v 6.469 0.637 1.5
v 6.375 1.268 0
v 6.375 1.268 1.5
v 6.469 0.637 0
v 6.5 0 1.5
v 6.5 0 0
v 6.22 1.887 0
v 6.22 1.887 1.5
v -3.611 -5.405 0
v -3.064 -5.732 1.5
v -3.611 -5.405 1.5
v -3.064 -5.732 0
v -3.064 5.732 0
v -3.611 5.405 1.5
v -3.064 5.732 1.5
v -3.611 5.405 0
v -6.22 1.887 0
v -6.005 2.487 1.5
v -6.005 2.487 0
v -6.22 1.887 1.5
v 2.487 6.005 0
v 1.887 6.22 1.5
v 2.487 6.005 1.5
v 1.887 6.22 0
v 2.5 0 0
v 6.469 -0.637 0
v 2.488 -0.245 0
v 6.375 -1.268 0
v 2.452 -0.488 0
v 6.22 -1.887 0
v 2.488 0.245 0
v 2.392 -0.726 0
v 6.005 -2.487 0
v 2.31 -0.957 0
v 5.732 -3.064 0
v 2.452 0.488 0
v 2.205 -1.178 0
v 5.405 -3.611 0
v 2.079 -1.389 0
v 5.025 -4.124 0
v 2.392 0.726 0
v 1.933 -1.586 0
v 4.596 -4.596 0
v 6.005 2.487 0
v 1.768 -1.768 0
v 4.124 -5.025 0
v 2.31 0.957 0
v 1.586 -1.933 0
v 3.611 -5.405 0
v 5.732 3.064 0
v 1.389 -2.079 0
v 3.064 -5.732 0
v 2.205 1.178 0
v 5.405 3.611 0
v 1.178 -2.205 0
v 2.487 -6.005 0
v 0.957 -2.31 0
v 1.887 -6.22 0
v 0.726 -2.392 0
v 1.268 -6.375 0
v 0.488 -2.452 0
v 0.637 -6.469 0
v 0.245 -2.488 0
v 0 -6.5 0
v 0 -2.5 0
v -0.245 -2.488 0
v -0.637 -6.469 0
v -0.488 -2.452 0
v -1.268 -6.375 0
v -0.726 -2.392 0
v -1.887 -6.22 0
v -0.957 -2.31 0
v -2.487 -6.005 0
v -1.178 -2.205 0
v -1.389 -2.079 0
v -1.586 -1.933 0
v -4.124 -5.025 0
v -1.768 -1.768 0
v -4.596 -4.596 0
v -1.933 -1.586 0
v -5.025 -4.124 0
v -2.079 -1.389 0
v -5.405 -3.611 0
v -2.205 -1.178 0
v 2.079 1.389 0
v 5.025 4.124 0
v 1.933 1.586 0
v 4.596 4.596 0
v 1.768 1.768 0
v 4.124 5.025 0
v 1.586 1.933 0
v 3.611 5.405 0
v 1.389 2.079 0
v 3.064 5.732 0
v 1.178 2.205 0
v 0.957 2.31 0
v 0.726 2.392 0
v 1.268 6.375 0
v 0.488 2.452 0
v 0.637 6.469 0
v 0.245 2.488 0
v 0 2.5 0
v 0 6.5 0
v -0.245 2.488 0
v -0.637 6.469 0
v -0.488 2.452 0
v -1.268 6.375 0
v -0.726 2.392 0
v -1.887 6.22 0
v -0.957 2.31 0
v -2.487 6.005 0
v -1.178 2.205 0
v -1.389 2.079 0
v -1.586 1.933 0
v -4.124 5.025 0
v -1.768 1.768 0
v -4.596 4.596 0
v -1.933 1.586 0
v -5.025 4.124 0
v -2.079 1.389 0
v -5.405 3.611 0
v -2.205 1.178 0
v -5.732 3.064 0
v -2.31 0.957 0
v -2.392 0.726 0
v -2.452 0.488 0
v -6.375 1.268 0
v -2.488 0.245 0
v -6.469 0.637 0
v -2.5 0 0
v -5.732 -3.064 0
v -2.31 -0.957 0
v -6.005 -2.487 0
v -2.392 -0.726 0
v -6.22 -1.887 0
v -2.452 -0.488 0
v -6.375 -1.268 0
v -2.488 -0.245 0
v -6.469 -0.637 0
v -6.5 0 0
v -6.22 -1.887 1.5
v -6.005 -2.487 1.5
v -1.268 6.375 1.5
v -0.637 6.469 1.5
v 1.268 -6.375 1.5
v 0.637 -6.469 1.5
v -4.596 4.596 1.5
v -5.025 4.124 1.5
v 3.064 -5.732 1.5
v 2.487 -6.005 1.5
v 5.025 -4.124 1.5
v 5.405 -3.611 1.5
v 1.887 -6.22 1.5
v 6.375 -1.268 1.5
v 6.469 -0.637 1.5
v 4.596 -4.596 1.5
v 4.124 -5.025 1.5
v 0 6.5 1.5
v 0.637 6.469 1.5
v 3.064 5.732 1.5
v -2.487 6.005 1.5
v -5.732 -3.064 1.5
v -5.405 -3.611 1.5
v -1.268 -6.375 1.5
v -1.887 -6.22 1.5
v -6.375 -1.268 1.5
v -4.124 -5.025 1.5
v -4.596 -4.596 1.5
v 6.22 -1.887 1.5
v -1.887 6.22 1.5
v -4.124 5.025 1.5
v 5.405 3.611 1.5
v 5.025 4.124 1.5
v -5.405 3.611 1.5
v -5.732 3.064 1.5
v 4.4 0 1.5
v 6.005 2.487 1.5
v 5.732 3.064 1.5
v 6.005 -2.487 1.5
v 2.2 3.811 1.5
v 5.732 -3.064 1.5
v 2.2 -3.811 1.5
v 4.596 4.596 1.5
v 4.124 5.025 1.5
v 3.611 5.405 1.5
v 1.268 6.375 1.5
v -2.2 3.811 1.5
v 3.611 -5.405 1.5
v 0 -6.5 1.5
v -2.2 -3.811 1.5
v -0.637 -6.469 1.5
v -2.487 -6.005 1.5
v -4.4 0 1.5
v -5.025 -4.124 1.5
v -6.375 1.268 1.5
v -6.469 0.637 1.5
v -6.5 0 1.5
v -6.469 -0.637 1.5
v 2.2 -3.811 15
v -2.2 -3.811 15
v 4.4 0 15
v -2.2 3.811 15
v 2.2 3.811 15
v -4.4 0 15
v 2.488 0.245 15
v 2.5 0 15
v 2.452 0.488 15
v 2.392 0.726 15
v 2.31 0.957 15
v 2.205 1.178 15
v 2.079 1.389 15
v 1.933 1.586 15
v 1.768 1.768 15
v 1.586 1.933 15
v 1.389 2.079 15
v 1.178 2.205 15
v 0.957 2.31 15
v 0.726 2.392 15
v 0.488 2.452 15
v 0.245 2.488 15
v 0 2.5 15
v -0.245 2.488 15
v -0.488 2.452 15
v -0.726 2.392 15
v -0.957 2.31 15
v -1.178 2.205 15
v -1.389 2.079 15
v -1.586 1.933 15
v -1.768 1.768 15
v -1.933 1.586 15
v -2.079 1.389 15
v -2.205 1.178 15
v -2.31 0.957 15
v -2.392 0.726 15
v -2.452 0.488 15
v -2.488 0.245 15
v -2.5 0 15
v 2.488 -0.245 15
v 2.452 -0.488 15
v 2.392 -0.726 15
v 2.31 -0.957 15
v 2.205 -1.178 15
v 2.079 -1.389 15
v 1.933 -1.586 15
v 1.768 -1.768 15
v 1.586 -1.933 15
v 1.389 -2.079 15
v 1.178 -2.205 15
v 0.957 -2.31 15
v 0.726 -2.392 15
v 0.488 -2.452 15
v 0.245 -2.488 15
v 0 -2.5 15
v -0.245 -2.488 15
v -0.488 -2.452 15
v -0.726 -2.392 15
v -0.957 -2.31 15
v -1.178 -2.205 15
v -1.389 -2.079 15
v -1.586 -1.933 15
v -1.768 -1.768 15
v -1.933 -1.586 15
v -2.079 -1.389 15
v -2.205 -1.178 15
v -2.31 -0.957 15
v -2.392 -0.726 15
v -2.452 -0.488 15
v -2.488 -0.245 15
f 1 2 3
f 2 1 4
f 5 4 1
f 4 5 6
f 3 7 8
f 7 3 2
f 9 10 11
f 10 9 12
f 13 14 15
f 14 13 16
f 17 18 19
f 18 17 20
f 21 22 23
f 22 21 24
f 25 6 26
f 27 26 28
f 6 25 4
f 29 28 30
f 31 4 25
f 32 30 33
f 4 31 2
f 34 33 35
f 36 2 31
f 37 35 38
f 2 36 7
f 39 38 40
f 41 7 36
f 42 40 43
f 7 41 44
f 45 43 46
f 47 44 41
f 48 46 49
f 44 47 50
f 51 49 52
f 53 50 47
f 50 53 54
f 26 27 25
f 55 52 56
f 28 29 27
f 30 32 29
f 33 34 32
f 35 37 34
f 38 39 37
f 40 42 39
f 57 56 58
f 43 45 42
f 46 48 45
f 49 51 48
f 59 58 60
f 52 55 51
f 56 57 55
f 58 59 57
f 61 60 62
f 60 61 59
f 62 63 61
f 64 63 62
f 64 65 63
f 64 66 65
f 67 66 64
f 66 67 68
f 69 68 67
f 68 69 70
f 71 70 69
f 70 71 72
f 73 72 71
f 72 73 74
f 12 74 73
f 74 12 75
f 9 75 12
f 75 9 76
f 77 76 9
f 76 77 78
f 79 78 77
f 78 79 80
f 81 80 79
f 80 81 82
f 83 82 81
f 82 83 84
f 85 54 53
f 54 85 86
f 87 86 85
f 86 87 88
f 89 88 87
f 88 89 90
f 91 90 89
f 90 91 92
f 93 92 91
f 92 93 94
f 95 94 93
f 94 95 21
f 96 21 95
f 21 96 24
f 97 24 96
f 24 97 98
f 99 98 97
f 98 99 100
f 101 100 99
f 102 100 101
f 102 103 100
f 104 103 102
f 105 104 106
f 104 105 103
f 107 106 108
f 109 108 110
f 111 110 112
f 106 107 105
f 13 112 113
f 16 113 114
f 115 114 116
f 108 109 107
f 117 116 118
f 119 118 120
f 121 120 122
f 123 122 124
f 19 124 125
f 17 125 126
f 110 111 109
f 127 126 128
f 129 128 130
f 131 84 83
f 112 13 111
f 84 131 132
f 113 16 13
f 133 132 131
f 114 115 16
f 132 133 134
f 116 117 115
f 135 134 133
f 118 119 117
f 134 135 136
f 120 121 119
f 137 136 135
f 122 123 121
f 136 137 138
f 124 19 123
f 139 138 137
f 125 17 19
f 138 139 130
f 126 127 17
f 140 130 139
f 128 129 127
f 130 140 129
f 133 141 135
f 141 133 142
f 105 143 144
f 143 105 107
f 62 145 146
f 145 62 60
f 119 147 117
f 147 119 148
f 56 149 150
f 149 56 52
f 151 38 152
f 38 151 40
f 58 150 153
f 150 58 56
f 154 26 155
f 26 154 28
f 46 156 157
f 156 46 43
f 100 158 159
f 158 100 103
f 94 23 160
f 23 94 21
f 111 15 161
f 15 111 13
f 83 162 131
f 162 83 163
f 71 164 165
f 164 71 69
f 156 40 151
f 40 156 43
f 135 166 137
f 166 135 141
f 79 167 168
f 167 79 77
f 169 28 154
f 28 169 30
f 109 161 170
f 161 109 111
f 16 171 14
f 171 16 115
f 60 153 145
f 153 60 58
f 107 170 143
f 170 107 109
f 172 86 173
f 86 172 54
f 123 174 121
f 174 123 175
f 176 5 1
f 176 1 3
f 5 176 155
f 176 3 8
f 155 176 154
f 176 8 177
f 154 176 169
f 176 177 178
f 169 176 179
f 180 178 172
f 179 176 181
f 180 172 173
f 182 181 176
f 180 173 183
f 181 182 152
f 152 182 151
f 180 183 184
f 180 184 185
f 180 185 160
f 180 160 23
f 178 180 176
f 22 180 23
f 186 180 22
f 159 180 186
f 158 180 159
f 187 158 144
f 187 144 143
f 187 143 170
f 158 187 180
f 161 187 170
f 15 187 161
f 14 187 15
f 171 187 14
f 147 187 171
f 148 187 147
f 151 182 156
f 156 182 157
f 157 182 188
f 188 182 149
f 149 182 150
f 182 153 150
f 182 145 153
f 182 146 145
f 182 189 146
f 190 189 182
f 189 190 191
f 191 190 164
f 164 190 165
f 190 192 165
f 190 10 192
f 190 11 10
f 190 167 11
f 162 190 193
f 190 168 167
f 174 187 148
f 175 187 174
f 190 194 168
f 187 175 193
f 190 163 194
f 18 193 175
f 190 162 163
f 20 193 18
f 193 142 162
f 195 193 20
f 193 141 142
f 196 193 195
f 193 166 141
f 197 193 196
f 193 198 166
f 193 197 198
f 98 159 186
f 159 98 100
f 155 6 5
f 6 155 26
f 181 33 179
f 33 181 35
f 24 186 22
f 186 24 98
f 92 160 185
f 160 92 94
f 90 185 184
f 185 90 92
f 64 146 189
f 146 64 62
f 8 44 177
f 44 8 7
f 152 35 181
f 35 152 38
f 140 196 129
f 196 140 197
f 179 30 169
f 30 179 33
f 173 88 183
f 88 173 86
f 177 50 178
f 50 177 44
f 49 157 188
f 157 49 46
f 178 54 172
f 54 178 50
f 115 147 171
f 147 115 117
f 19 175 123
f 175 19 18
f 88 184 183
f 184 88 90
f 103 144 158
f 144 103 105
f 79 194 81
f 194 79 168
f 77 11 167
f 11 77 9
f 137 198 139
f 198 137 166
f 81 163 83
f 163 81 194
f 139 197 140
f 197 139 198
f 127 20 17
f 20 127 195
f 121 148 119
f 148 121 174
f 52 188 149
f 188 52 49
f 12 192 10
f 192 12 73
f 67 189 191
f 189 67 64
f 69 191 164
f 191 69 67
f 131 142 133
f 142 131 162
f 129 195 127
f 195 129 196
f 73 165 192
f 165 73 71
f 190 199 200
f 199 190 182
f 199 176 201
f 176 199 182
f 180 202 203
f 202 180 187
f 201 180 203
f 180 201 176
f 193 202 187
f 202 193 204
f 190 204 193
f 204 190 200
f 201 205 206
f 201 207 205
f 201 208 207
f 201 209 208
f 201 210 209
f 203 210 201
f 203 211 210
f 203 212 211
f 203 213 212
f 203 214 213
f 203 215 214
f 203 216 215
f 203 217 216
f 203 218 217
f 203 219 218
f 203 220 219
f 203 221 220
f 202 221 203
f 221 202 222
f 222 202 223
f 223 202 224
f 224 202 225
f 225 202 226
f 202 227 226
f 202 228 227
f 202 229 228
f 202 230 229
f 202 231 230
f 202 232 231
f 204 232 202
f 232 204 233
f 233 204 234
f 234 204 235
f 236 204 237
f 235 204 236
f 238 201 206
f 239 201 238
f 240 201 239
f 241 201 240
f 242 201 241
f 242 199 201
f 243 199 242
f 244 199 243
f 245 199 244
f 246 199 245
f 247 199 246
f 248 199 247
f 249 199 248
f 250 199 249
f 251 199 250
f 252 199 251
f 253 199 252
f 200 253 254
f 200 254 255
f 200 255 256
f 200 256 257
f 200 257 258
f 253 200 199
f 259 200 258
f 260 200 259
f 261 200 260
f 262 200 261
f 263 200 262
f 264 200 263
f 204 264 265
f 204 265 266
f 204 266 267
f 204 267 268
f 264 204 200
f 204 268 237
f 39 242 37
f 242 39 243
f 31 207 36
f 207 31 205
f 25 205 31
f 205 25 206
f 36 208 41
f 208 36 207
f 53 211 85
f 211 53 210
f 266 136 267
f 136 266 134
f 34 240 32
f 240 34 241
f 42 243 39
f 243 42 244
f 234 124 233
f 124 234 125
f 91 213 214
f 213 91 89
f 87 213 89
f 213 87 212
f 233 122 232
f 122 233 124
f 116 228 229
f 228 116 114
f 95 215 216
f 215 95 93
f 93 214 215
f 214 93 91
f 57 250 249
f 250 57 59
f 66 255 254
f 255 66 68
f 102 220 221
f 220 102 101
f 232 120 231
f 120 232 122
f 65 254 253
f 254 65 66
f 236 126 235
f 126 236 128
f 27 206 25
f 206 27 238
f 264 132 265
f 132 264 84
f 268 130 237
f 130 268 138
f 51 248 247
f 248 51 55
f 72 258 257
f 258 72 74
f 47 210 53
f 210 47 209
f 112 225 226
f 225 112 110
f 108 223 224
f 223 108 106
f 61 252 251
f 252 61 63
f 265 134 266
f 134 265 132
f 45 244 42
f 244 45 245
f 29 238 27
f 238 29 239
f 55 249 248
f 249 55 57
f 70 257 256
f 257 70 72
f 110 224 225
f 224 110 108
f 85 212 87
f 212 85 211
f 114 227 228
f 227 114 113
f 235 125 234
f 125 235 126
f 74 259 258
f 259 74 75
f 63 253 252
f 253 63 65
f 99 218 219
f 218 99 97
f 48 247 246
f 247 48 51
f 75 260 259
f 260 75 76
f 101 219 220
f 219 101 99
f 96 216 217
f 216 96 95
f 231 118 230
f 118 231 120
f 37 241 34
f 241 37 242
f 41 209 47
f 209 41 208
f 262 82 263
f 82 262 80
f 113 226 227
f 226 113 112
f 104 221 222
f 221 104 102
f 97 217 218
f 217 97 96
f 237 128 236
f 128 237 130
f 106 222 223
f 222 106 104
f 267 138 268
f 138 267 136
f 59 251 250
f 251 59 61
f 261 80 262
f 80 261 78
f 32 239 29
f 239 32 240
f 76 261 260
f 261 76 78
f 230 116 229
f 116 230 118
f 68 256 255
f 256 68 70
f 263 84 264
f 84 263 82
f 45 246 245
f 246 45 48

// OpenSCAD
// Rivet nut — M6, hex body, flanged

flange_od  = 13;
flange_h   = 1.5;
body_od    = 8.8;   // hex across corners
body_h     = 13.5;  // = total_h - flange_h
thread_d   = 5.0;   // M6 minor diameter (simplified, no real thread)

$fn = 64;

module rivet_nut() {
    difference() {
        union() {
            cylinder(h = flange_h, d = flange_od);
            translate([0, 0, flange_h])
                cylinder(h = body_h, d = body_od, $fn = 6);
        }
        translate([0, 0, -0.1])
            cylinder(h = flange_h + body_h + 0.2, d = thread_d);
    }
}

rivet_nut();
